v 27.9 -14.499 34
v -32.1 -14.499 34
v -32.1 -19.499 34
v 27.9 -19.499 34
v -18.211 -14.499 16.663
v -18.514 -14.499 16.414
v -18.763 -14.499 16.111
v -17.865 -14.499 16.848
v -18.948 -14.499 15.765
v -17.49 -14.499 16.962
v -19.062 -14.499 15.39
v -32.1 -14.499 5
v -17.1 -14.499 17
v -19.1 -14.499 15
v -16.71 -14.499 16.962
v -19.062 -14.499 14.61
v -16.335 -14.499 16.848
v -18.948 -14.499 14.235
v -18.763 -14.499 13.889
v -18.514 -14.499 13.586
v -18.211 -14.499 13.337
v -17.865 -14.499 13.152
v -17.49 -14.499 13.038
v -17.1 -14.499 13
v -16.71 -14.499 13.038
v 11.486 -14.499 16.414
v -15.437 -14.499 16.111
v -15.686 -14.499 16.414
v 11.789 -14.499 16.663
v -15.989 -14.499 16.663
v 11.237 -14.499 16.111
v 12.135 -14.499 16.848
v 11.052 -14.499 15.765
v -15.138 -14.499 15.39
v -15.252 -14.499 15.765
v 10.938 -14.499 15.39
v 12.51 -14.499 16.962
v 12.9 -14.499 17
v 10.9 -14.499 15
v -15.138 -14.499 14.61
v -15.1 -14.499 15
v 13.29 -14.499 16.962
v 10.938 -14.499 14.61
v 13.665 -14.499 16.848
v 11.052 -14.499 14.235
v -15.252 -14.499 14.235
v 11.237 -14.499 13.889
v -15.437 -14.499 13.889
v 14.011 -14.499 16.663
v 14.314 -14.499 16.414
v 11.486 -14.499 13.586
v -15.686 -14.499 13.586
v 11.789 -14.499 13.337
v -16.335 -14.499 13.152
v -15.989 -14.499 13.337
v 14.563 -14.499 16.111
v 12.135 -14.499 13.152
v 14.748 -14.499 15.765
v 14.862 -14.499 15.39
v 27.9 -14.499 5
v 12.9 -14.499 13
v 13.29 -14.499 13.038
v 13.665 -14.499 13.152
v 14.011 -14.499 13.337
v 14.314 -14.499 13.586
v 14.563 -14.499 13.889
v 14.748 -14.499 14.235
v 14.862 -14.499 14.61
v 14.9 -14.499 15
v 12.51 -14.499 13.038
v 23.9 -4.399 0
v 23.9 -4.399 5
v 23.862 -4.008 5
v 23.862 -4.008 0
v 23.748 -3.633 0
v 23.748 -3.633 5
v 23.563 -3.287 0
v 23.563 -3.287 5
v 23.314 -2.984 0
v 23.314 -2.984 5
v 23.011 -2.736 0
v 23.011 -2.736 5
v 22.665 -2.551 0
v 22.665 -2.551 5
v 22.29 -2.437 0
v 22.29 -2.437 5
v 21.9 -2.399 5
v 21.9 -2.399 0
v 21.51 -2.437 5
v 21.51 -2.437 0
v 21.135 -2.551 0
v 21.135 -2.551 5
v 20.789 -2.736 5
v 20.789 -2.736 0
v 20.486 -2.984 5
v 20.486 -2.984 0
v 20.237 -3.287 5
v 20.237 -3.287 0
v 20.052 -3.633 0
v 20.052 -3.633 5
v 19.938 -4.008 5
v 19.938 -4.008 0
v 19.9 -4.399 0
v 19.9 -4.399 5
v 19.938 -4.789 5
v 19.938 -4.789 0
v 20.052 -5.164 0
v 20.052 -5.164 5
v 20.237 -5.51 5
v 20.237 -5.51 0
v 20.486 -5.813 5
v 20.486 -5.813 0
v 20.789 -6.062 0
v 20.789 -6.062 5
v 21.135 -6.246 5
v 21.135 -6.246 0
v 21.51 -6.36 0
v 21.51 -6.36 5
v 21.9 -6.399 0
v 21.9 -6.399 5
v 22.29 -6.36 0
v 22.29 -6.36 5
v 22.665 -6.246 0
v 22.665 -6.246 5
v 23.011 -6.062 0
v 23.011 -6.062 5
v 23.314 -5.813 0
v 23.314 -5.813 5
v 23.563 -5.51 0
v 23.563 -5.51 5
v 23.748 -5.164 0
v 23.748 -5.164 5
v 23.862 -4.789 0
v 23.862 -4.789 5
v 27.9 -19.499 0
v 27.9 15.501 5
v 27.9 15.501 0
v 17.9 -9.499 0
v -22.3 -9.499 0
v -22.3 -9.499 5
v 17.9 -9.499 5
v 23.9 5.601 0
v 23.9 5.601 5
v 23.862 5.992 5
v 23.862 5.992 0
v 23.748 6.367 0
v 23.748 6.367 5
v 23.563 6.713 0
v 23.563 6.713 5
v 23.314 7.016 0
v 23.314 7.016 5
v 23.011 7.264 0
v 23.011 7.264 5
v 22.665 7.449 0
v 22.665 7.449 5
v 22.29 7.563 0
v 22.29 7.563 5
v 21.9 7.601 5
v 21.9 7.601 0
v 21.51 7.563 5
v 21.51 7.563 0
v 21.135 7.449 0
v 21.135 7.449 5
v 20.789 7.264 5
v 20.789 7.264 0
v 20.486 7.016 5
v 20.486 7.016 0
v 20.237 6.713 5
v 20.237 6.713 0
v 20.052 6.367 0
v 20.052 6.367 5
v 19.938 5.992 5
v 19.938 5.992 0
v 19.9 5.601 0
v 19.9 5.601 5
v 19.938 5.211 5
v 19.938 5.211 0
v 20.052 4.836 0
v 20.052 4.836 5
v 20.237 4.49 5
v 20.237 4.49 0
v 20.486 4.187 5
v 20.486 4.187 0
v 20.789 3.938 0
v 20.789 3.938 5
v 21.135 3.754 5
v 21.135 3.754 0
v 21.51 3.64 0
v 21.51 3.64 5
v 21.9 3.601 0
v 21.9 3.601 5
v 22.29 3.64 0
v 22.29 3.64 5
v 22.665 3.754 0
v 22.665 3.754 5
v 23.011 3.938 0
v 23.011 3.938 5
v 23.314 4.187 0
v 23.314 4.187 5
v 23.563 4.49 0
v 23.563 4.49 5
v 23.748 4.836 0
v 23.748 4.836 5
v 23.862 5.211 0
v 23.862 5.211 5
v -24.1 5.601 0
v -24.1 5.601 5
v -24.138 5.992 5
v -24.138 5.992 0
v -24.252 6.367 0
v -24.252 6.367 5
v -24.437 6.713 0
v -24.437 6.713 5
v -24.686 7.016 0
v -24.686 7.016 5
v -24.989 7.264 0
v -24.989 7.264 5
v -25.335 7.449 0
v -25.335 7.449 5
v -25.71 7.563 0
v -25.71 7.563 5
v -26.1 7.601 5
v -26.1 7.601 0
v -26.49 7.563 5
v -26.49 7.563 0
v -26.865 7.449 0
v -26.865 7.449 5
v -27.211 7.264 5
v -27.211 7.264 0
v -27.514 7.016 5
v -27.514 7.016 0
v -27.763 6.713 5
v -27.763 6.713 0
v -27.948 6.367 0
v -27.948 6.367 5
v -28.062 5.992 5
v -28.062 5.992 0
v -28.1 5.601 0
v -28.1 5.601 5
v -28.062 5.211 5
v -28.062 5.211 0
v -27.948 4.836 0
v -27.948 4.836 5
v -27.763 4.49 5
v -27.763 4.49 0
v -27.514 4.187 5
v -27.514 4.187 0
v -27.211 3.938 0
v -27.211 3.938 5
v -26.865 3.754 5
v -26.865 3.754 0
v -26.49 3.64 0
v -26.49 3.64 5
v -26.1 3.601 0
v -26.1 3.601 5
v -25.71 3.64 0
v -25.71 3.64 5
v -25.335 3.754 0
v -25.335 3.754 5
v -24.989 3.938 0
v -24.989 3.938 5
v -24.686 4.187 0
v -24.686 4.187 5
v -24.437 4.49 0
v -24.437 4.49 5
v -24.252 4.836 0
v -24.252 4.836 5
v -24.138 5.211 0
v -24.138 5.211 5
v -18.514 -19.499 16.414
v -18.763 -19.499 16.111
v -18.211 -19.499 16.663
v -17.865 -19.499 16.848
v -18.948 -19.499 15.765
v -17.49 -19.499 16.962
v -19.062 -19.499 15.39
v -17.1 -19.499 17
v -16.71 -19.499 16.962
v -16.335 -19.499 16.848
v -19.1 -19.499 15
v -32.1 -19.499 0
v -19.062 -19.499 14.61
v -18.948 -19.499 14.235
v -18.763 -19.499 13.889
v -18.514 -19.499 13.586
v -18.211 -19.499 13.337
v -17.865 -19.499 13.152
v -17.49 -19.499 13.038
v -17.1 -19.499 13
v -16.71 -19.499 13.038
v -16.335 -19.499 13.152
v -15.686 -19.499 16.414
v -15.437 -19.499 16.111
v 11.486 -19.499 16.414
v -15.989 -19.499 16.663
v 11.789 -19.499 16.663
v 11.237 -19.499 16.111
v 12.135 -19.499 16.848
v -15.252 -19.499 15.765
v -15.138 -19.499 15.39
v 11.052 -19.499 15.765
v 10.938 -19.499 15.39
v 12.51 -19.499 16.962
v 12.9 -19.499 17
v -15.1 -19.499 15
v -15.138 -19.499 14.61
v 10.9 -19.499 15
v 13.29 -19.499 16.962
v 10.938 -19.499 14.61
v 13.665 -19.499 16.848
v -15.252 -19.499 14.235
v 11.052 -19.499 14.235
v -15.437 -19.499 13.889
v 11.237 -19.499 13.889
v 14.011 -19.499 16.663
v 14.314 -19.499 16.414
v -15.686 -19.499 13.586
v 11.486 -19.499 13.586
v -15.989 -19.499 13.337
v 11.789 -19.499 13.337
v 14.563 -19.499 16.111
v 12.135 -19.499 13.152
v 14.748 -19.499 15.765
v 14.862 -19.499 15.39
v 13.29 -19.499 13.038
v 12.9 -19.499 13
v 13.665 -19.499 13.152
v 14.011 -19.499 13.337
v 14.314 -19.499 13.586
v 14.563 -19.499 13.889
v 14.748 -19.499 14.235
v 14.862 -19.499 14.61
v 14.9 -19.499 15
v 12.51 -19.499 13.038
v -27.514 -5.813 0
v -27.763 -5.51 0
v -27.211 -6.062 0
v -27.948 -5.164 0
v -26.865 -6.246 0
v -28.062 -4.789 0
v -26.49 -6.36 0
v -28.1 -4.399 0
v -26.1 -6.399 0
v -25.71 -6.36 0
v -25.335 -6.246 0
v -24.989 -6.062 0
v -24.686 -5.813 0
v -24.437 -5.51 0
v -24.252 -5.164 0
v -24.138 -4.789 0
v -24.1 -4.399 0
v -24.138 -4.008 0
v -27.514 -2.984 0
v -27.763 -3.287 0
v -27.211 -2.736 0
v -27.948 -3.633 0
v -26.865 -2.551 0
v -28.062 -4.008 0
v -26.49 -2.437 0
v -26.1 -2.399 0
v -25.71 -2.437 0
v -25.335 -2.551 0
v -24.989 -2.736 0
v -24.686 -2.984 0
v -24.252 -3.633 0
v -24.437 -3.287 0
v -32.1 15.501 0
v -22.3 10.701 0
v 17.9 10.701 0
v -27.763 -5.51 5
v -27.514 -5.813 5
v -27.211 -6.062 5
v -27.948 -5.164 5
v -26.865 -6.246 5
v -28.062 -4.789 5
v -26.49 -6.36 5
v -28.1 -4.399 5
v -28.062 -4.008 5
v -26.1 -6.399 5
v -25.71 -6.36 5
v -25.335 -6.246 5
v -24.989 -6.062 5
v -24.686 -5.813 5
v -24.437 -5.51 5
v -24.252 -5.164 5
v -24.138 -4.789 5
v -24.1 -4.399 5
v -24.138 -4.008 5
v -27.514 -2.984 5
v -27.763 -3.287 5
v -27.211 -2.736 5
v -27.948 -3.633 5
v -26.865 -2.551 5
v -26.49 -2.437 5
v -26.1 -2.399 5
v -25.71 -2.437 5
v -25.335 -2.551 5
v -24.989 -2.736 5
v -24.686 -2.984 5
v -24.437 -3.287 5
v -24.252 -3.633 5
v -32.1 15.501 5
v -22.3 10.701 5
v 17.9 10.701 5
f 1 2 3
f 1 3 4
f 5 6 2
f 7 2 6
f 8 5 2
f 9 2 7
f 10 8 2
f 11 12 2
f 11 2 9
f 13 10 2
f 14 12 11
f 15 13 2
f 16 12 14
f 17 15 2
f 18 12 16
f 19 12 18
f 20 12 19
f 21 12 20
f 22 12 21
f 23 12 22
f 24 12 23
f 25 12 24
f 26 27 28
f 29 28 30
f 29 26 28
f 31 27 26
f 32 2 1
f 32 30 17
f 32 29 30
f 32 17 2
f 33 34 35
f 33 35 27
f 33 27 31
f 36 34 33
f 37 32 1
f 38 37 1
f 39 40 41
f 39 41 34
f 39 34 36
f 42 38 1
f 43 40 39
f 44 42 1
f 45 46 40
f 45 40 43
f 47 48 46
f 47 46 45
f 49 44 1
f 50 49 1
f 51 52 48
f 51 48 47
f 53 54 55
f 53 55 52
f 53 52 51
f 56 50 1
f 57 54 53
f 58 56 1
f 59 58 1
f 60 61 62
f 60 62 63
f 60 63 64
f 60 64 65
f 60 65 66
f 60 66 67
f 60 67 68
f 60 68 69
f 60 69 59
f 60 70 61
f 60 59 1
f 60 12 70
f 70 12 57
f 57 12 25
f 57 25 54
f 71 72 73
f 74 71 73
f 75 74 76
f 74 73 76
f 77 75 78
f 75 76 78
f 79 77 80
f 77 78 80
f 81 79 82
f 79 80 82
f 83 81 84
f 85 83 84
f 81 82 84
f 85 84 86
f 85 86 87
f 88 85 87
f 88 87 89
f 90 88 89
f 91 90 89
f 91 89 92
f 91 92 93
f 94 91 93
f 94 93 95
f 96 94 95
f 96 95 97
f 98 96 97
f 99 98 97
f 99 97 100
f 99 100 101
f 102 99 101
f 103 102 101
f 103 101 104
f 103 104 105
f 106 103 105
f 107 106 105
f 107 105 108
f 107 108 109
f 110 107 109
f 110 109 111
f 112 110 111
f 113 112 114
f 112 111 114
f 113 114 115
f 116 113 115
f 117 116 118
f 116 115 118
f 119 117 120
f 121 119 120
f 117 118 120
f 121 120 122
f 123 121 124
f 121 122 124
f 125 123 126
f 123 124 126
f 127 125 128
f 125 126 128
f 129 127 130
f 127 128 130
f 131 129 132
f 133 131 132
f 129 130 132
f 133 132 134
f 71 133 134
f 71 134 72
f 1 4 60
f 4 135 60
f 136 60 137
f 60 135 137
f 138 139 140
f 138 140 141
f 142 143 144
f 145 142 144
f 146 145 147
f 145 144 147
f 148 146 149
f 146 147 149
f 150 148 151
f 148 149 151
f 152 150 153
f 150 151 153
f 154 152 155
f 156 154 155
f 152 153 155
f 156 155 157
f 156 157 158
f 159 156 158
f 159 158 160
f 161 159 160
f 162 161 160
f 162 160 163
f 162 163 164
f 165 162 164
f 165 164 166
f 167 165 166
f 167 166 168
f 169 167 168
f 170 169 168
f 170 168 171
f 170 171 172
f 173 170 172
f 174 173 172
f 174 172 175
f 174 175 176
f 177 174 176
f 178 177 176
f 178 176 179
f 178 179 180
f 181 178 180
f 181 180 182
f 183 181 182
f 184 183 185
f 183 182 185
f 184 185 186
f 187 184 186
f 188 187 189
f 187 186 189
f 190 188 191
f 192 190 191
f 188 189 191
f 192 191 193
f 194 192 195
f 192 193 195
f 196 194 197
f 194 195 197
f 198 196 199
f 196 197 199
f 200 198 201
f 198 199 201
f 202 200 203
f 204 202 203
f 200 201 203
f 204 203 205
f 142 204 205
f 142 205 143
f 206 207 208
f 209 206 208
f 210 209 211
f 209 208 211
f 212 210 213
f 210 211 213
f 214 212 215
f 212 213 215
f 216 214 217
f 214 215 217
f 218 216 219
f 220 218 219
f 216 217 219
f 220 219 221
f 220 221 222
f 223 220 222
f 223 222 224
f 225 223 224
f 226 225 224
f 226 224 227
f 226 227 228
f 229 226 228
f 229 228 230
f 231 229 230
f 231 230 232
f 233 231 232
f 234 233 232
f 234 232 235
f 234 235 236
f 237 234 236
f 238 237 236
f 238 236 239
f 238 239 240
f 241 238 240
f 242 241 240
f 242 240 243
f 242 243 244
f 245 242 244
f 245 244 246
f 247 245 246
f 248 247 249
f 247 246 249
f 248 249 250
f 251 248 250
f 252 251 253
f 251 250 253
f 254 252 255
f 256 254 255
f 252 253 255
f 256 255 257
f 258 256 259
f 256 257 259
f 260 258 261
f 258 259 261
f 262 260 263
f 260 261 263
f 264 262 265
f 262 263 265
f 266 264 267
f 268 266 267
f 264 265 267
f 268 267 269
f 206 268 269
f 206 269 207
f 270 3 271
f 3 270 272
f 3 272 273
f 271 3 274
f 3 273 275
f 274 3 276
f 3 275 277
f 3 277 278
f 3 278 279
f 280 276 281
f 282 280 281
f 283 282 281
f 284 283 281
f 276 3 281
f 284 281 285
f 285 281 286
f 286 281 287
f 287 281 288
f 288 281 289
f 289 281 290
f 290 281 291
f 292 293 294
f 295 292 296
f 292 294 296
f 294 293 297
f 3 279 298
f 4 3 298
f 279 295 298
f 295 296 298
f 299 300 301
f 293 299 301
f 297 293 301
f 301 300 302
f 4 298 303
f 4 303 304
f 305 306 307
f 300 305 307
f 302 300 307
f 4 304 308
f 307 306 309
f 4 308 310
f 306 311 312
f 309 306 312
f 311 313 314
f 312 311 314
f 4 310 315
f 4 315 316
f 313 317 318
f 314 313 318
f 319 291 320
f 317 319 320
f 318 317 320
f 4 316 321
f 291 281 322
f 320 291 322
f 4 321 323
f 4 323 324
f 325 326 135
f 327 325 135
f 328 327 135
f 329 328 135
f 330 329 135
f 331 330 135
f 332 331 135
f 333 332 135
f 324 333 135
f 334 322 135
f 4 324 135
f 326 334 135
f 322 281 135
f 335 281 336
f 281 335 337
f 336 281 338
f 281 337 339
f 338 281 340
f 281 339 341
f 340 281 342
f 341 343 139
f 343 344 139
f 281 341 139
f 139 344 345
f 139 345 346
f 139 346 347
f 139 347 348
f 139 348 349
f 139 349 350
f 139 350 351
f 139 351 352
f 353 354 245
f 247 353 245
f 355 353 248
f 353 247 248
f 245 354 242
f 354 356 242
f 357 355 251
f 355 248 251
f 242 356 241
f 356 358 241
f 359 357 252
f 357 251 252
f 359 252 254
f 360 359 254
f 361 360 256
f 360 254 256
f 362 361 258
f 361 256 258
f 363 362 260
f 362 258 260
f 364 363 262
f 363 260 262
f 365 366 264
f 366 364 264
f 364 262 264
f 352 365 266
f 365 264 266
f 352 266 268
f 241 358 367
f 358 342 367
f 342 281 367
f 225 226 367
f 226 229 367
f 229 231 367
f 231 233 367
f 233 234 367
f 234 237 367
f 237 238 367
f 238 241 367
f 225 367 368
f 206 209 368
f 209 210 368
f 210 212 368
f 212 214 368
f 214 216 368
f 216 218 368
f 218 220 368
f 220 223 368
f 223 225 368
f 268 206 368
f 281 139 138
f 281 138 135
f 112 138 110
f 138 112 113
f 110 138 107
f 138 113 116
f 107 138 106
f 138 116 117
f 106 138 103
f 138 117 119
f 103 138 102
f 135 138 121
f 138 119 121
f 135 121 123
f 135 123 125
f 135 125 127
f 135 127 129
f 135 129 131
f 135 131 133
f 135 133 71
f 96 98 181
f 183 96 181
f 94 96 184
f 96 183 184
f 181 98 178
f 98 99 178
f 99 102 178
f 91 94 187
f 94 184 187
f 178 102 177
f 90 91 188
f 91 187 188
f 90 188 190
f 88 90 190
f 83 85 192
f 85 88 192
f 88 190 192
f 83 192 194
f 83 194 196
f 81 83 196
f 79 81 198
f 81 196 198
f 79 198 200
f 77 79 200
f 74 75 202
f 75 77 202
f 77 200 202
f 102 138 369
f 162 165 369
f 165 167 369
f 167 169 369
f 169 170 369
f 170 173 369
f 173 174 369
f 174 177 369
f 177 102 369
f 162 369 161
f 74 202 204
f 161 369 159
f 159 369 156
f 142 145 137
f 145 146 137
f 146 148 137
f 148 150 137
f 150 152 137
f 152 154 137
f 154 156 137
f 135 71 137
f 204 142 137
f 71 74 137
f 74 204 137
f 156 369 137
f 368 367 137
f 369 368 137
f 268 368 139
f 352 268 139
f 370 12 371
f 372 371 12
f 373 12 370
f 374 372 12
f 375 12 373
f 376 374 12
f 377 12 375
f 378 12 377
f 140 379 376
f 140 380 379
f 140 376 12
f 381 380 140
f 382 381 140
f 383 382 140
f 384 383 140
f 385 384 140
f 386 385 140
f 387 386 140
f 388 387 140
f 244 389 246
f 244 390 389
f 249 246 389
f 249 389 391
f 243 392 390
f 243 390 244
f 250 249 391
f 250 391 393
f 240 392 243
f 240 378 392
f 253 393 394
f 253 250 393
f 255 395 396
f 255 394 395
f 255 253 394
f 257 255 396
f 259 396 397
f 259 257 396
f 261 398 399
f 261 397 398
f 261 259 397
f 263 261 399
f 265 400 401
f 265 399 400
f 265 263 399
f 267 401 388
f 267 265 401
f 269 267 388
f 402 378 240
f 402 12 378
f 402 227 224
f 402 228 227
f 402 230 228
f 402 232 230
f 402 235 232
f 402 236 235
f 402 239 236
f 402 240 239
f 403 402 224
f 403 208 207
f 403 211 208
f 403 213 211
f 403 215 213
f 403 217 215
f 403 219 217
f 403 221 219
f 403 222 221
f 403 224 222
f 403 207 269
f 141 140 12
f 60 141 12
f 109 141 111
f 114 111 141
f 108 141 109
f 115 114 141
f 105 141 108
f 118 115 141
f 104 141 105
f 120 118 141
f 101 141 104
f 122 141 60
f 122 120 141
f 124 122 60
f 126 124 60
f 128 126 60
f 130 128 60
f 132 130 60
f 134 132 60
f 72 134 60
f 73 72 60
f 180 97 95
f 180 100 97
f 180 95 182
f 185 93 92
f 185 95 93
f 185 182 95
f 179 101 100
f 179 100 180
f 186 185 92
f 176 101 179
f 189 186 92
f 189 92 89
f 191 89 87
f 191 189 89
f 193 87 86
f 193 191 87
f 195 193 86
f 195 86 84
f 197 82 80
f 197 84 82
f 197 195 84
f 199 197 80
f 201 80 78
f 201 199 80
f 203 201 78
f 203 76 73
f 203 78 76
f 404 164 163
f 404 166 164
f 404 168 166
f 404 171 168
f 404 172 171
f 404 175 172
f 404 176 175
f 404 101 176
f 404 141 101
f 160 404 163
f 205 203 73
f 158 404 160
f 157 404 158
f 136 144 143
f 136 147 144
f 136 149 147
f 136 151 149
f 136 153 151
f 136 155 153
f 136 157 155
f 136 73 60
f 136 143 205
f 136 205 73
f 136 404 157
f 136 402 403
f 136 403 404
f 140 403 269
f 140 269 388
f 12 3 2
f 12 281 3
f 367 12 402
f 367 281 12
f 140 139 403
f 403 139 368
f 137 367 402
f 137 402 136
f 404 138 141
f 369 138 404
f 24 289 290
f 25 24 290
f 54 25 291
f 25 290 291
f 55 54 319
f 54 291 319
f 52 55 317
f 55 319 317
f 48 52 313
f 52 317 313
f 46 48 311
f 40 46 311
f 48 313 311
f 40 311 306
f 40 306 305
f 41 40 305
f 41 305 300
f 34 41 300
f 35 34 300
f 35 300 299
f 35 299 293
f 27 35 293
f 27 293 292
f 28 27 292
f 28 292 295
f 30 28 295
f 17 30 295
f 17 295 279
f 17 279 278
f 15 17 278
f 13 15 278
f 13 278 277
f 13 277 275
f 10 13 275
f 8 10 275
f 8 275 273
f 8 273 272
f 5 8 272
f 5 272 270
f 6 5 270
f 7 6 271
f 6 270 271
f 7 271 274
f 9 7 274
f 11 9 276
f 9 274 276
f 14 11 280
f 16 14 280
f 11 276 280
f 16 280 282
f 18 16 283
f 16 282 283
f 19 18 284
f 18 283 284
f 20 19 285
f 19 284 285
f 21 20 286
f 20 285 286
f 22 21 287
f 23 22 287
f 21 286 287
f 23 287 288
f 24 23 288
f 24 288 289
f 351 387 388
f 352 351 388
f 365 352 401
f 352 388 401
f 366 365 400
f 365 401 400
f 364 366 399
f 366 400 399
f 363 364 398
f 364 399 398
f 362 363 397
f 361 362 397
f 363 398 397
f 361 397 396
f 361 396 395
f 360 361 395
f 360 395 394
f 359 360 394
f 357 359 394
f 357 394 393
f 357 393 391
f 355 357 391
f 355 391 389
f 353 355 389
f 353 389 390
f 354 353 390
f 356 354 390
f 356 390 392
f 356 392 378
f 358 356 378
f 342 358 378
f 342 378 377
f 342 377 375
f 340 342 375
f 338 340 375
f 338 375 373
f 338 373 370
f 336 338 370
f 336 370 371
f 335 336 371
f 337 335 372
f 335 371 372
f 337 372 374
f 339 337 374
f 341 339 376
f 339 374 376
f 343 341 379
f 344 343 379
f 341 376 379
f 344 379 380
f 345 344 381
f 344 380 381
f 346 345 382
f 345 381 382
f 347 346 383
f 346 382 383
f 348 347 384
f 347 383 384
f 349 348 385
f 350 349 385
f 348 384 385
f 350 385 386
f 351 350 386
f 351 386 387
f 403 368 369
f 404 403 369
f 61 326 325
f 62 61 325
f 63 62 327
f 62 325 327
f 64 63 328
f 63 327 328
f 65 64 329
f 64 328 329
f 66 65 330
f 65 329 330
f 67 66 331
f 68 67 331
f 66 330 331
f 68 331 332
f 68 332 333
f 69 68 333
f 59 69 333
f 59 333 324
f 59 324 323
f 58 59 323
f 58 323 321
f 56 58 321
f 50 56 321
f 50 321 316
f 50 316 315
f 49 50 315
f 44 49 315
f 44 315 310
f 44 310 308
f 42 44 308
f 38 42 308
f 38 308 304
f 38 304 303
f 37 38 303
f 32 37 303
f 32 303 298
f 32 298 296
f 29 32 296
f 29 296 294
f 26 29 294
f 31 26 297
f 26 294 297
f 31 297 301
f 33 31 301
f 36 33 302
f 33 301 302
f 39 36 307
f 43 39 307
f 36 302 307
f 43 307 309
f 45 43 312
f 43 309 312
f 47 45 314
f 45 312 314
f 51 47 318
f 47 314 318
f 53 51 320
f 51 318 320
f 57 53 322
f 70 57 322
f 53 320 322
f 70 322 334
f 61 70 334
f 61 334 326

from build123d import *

# Parameters (mm, degrees)
SKETCH1_W           = 60
SKETCH1_H           = 35
SKETCH1_W_2         = 40.2
SKETCH1_H_2         = 20.2
BOSS_EXTRUDE1_DEPTH = 5
SKETCH2_W           = 60
SKETCH2_H           = 5
BOSS_EXTRUDE2_DEPTH = 29
SKETCH3_R           = 2
CUT_EXTRUDE1_DEPTH  = 10
SKETCH4_R           = 2
CUT_EXTRUDE2_DEPTH  = 48.451090489


with BuildPart() as part:
    # Sketch1 → Boss-Extrude1 (new body)
    with BuildSketch(Plane.XY):
        with Locations((-2.1, -1.998615043)):
            Rectangle(SKETCH1_W, SKETCH1_H)
        with Locations((-2.2, 0.601384957)):
            Rectangle(SKETCH1_W_2, SKETCH1_H_2, mode=Mode.SUBTRACT)
    extrude(amount=BOSS_EXTRUDE1_DEPTH)

    # Sketch2 → Boss-Extrude2 (add)
    with BuildSketch(Plane.XY.offset(5)):
        with Locations((-2.1, -16.998615043)):
            Rectangle(SKETCH2_W, SKETCH2_H)
    extrude(amount=BOSS_EXTRUDE2_DEPTH)

    # Sketch3 → Cut-Extrude1 (cut)
    with BuildSketch(Plane(origin=(0, -19.498615043, 0), x_dir=(-1, 0, 0), z_dir=(0, -1, 0))):
        with Locations(Location((17.1, -15, 0), (0, 0, 90))):
            Circle(SKETCH3_R)
        with Locations(Location((-12.9, -15, 0), (0, 0, 90))):
            Circle(SKETCH3_R)
    extrude(amount=-CUT_EXTRUDE1_DEPTH, mode=Mode.SUBTRACT)

    # Sketch4 → Cut-Extrude2 (cut, through all)
    with BuildSketch(Plane.XY.offset(5)):
        with Locations((21.9, 5.601384957)):
            Circle(SKETCH4_R)
        with Locations((21.9, -4.398615043)):
            Circle(SKETCH4_R)
        with Locations((-26.1, -4.398615043)):
            Circle(SKETCH4_R)
        with Locations((-26.1, 5.601384957)):
            Circle(SKETCH4_R)
    extrude(amount=-CUT_EXTRUDE2_DEPTH, mode=Mode.SUBTRACT)


solid = part.part
